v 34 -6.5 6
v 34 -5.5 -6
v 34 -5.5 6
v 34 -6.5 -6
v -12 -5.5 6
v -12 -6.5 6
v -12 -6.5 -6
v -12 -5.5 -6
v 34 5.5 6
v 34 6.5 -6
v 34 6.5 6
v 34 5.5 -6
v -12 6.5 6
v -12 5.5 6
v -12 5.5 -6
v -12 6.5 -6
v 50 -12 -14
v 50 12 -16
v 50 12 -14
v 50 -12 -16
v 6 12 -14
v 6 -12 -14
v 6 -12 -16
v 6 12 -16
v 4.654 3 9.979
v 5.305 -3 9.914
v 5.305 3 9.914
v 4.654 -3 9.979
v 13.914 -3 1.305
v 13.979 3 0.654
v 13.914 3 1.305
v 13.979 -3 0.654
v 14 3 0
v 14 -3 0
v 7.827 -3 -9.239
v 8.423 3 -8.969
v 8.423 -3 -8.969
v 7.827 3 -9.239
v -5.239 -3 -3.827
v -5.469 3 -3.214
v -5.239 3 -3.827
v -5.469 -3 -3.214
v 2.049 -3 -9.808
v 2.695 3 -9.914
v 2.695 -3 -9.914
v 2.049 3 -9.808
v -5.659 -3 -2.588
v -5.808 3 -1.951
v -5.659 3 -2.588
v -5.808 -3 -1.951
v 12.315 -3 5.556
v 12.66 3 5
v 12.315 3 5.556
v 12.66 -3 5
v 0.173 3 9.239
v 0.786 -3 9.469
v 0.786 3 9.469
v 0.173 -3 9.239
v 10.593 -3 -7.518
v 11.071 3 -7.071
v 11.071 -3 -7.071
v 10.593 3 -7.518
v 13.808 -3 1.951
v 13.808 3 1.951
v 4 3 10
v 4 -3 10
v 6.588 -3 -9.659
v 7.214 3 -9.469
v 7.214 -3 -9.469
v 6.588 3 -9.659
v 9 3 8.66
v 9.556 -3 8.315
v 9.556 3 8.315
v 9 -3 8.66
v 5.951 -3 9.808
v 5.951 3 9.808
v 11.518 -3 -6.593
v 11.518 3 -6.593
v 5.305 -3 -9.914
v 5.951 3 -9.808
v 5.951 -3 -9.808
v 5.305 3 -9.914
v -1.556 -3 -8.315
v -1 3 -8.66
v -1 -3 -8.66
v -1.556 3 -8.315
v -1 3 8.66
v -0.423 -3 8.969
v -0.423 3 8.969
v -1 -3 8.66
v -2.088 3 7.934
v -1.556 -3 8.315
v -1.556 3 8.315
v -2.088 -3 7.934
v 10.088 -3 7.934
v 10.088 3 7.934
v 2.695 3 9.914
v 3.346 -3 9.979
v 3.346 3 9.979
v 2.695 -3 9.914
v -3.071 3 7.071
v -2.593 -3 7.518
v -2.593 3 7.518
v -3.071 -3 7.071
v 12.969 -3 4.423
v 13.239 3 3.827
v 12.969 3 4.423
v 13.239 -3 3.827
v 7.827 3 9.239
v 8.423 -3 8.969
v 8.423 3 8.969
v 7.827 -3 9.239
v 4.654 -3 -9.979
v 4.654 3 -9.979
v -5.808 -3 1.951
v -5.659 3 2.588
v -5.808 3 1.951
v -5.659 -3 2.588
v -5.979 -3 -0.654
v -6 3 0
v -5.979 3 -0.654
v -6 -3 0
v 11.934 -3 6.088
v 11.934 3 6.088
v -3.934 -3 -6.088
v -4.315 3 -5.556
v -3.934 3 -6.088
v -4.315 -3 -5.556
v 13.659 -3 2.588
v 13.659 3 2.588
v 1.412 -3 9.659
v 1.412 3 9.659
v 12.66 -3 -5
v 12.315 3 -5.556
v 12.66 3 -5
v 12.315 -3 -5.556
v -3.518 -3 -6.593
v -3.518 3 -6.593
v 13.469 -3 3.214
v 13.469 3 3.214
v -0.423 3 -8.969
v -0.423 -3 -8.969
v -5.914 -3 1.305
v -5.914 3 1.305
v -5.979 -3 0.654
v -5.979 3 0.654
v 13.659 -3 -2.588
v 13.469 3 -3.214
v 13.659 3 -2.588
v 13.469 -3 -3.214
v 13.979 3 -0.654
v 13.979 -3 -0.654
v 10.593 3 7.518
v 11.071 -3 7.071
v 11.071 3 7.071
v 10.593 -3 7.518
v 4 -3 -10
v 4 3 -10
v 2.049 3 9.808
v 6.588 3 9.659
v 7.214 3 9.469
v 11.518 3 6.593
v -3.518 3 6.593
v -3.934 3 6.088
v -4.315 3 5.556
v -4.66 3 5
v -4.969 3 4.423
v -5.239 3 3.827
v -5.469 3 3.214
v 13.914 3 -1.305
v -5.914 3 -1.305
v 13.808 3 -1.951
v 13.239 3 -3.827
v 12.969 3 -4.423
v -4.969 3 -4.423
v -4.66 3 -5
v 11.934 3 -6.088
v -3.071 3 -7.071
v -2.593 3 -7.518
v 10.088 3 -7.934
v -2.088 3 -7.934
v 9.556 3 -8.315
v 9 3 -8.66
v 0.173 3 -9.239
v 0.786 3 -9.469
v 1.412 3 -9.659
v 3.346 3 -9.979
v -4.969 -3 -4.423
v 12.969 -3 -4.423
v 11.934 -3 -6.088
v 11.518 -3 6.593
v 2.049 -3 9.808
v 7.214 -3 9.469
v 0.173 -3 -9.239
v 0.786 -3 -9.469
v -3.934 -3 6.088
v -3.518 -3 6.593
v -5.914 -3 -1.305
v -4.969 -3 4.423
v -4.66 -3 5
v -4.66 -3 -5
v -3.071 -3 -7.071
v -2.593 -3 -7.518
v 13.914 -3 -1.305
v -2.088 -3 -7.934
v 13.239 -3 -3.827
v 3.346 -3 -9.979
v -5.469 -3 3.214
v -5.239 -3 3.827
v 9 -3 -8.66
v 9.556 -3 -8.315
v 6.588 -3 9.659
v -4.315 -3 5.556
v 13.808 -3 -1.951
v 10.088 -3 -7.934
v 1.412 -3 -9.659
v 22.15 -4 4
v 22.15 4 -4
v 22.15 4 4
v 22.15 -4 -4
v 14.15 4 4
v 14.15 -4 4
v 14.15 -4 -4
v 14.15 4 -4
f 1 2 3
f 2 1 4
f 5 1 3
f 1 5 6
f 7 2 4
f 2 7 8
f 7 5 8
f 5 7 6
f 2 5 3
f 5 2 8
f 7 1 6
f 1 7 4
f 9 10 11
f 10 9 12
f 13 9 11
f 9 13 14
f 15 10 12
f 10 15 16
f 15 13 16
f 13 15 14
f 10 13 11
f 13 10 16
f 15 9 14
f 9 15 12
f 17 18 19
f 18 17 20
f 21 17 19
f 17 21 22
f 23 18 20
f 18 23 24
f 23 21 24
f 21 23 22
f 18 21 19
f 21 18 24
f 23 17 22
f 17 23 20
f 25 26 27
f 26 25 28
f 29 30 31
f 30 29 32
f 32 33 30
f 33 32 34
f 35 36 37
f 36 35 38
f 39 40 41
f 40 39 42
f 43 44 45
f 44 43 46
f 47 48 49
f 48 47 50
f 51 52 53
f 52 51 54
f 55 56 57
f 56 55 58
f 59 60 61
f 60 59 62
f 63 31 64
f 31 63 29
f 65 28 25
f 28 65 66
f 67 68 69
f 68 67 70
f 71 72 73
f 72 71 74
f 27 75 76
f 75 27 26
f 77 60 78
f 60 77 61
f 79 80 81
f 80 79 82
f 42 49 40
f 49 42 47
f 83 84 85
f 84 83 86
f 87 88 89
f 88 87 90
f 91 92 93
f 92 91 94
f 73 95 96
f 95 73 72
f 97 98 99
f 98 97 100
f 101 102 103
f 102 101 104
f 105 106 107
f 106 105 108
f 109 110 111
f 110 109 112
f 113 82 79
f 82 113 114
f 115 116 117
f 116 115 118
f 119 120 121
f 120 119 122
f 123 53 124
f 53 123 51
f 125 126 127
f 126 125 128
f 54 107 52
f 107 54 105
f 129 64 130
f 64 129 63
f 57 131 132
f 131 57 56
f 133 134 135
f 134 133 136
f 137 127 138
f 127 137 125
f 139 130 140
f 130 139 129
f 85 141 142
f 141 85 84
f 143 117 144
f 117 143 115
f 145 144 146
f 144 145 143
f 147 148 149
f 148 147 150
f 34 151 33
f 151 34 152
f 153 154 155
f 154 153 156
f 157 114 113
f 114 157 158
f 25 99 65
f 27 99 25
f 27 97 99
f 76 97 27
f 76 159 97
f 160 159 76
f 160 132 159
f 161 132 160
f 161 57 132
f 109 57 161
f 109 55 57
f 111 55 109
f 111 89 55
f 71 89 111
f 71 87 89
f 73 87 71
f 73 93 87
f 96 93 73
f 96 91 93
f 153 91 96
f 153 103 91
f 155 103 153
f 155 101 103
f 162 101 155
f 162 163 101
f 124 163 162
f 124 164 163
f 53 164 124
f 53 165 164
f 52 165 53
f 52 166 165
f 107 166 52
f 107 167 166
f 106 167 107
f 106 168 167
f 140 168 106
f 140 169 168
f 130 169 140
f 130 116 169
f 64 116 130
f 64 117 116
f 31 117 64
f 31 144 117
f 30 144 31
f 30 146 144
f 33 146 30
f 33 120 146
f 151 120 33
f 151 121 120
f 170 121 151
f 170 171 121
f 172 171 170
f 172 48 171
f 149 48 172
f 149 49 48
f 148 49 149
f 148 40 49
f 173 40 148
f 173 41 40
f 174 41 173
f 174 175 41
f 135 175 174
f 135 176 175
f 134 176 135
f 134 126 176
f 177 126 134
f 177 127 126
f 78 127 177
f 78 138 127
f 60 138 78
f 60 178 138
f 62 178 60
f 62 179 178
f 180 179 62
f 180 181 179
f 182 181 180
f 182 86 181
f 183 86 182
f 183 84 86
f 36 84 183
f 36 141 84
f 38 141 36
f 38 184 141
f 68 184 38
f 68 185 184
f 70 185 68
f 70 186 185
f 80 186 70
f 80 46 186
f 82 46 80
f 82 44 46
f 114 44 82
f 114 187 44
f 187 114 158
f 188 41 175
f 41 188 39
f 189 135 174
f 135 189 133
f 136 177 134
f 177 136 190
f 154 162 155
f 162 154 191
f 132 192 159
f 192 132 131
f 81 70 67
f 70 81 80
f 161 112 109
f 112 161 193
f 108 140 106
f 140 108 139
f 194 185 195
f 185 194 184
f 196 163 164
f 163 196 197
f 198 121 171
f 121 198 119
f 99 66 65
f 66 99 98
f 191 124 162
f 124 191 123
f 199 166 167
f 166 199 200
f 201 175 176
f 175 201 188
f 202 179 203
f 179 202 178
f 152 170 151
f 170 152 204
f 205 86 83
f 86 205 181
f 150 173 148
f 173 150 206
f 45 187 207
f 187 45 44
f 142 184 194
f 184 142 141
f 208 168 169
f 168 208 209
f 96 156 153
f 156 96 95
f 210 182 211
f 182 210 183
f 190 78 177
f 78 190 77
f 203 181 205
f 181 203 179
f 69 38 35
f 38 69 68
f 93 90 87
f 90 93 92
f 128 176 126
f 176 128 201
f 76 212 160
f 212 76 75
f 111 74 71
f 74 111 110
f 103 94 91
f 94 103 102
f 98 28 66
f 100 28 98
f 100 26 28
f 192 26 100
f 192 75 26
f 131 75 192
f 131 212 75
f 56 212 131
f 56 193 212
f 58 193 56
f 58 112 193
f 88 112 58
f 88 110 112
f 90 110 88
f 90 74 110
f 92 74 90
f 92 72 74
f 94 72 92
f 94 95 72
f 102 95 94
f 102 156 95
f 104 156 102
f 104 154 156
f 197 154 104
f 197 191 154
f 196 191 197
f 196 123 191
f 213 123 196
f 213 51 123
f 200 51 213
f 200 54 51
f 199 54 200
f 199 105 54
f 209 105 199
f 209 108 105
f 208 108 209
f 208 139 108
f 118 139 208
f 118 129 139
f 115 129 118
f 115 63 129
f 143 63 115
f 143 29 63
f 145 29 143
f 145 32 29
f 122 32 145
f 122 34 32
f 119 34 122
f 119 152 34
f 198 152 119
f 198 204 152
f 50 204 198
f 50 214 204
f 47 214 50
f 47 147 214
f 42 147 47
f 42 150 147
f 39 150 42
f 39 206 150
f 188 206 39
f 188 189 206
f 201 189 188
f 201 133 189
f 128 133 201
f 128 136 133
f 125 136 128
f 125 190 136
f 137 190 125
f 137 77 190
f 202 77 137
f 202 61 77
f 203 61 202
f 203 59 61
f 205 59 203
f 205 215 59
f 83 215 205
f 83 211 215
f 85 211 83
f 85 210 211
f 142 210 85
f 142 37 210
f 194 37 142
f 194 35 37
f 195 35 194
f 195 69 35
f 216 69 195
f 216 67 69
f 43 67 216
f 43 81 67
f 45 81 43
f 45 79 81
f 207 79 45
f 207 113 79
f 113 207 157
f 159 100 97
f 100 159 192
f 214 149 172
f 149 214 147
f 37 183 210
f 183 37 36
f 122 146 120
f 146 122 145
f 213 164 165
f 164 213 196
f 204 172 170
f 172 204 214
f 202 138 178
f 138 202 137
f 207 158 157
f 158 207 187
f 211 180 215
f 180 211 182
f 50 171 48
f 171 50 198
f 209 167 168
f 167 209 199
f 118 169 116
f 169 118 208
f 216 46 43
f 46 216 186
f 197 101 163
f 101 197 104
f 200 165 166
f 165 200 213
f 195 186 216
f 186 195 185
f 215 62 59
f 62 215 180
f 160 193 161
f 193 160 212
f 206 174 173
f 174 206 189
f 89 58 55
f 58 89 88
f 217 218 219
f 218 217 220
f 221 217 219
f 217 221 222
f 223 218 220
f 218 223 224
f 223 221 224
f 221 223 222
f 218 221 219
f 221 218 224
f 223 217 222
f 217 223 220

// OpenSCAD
// Eccentric disk cam with a flat translating follower.
// Two-dimensional mechanism in the XZ plane; the cam rotates about +Y.
// The follower face is perpendicular to +X and moves along X.
cam_angle = 0;
agentscad_part = "all";
eccentricity = 4;
cam_radius = 10;
cam_thickness = 6;
follower_gap = 0.15;
follower_length = 8;
follower_width = 8;
follower_height = 8;
$fn = 96;

module frame_local() {
  // Base plate below the mechanism.
  translate([6, -12, -16]) cube([44, 24, 2]);
  // Two guide rails around the follower; they do not touch the cam.
  for (yy = [-6.5, 5.5]) translate([-12, yy, -6]) cube([46, 1, 12]);
}

module cam_local() {
  // Eccentric disk in the XZ plane; the shaft is omitted so the frame needs no bearing.
  rotate([90, 0, 0]) translate([eccentricity, 0, 0]) cylinder(r = cam_radius, h = cam_thickness, center = true);
}

module follower_local() {
  // Flat face at x = R + e cos(theta) + gap; block extends to +X.
  xpos = cam_radius + eccentricity * cos(cam_angle) + follower_gap;
  translate([xpos, -follower_width / 2, -follower_height / 2])
    cube([follower_length, follower_width, follower_height]);
}

module assembly() {
  if (agentscad_part == "all" || agentscad_part == "frame") frame_local();
  if (agentscad_part == "all" || agentscad_part == "cam") rotate([0, cam_angle, 0]) cam_local();
  if (agentscad_part == "all" || agentscad_part == "follower") follower_local();
}

assembly();
